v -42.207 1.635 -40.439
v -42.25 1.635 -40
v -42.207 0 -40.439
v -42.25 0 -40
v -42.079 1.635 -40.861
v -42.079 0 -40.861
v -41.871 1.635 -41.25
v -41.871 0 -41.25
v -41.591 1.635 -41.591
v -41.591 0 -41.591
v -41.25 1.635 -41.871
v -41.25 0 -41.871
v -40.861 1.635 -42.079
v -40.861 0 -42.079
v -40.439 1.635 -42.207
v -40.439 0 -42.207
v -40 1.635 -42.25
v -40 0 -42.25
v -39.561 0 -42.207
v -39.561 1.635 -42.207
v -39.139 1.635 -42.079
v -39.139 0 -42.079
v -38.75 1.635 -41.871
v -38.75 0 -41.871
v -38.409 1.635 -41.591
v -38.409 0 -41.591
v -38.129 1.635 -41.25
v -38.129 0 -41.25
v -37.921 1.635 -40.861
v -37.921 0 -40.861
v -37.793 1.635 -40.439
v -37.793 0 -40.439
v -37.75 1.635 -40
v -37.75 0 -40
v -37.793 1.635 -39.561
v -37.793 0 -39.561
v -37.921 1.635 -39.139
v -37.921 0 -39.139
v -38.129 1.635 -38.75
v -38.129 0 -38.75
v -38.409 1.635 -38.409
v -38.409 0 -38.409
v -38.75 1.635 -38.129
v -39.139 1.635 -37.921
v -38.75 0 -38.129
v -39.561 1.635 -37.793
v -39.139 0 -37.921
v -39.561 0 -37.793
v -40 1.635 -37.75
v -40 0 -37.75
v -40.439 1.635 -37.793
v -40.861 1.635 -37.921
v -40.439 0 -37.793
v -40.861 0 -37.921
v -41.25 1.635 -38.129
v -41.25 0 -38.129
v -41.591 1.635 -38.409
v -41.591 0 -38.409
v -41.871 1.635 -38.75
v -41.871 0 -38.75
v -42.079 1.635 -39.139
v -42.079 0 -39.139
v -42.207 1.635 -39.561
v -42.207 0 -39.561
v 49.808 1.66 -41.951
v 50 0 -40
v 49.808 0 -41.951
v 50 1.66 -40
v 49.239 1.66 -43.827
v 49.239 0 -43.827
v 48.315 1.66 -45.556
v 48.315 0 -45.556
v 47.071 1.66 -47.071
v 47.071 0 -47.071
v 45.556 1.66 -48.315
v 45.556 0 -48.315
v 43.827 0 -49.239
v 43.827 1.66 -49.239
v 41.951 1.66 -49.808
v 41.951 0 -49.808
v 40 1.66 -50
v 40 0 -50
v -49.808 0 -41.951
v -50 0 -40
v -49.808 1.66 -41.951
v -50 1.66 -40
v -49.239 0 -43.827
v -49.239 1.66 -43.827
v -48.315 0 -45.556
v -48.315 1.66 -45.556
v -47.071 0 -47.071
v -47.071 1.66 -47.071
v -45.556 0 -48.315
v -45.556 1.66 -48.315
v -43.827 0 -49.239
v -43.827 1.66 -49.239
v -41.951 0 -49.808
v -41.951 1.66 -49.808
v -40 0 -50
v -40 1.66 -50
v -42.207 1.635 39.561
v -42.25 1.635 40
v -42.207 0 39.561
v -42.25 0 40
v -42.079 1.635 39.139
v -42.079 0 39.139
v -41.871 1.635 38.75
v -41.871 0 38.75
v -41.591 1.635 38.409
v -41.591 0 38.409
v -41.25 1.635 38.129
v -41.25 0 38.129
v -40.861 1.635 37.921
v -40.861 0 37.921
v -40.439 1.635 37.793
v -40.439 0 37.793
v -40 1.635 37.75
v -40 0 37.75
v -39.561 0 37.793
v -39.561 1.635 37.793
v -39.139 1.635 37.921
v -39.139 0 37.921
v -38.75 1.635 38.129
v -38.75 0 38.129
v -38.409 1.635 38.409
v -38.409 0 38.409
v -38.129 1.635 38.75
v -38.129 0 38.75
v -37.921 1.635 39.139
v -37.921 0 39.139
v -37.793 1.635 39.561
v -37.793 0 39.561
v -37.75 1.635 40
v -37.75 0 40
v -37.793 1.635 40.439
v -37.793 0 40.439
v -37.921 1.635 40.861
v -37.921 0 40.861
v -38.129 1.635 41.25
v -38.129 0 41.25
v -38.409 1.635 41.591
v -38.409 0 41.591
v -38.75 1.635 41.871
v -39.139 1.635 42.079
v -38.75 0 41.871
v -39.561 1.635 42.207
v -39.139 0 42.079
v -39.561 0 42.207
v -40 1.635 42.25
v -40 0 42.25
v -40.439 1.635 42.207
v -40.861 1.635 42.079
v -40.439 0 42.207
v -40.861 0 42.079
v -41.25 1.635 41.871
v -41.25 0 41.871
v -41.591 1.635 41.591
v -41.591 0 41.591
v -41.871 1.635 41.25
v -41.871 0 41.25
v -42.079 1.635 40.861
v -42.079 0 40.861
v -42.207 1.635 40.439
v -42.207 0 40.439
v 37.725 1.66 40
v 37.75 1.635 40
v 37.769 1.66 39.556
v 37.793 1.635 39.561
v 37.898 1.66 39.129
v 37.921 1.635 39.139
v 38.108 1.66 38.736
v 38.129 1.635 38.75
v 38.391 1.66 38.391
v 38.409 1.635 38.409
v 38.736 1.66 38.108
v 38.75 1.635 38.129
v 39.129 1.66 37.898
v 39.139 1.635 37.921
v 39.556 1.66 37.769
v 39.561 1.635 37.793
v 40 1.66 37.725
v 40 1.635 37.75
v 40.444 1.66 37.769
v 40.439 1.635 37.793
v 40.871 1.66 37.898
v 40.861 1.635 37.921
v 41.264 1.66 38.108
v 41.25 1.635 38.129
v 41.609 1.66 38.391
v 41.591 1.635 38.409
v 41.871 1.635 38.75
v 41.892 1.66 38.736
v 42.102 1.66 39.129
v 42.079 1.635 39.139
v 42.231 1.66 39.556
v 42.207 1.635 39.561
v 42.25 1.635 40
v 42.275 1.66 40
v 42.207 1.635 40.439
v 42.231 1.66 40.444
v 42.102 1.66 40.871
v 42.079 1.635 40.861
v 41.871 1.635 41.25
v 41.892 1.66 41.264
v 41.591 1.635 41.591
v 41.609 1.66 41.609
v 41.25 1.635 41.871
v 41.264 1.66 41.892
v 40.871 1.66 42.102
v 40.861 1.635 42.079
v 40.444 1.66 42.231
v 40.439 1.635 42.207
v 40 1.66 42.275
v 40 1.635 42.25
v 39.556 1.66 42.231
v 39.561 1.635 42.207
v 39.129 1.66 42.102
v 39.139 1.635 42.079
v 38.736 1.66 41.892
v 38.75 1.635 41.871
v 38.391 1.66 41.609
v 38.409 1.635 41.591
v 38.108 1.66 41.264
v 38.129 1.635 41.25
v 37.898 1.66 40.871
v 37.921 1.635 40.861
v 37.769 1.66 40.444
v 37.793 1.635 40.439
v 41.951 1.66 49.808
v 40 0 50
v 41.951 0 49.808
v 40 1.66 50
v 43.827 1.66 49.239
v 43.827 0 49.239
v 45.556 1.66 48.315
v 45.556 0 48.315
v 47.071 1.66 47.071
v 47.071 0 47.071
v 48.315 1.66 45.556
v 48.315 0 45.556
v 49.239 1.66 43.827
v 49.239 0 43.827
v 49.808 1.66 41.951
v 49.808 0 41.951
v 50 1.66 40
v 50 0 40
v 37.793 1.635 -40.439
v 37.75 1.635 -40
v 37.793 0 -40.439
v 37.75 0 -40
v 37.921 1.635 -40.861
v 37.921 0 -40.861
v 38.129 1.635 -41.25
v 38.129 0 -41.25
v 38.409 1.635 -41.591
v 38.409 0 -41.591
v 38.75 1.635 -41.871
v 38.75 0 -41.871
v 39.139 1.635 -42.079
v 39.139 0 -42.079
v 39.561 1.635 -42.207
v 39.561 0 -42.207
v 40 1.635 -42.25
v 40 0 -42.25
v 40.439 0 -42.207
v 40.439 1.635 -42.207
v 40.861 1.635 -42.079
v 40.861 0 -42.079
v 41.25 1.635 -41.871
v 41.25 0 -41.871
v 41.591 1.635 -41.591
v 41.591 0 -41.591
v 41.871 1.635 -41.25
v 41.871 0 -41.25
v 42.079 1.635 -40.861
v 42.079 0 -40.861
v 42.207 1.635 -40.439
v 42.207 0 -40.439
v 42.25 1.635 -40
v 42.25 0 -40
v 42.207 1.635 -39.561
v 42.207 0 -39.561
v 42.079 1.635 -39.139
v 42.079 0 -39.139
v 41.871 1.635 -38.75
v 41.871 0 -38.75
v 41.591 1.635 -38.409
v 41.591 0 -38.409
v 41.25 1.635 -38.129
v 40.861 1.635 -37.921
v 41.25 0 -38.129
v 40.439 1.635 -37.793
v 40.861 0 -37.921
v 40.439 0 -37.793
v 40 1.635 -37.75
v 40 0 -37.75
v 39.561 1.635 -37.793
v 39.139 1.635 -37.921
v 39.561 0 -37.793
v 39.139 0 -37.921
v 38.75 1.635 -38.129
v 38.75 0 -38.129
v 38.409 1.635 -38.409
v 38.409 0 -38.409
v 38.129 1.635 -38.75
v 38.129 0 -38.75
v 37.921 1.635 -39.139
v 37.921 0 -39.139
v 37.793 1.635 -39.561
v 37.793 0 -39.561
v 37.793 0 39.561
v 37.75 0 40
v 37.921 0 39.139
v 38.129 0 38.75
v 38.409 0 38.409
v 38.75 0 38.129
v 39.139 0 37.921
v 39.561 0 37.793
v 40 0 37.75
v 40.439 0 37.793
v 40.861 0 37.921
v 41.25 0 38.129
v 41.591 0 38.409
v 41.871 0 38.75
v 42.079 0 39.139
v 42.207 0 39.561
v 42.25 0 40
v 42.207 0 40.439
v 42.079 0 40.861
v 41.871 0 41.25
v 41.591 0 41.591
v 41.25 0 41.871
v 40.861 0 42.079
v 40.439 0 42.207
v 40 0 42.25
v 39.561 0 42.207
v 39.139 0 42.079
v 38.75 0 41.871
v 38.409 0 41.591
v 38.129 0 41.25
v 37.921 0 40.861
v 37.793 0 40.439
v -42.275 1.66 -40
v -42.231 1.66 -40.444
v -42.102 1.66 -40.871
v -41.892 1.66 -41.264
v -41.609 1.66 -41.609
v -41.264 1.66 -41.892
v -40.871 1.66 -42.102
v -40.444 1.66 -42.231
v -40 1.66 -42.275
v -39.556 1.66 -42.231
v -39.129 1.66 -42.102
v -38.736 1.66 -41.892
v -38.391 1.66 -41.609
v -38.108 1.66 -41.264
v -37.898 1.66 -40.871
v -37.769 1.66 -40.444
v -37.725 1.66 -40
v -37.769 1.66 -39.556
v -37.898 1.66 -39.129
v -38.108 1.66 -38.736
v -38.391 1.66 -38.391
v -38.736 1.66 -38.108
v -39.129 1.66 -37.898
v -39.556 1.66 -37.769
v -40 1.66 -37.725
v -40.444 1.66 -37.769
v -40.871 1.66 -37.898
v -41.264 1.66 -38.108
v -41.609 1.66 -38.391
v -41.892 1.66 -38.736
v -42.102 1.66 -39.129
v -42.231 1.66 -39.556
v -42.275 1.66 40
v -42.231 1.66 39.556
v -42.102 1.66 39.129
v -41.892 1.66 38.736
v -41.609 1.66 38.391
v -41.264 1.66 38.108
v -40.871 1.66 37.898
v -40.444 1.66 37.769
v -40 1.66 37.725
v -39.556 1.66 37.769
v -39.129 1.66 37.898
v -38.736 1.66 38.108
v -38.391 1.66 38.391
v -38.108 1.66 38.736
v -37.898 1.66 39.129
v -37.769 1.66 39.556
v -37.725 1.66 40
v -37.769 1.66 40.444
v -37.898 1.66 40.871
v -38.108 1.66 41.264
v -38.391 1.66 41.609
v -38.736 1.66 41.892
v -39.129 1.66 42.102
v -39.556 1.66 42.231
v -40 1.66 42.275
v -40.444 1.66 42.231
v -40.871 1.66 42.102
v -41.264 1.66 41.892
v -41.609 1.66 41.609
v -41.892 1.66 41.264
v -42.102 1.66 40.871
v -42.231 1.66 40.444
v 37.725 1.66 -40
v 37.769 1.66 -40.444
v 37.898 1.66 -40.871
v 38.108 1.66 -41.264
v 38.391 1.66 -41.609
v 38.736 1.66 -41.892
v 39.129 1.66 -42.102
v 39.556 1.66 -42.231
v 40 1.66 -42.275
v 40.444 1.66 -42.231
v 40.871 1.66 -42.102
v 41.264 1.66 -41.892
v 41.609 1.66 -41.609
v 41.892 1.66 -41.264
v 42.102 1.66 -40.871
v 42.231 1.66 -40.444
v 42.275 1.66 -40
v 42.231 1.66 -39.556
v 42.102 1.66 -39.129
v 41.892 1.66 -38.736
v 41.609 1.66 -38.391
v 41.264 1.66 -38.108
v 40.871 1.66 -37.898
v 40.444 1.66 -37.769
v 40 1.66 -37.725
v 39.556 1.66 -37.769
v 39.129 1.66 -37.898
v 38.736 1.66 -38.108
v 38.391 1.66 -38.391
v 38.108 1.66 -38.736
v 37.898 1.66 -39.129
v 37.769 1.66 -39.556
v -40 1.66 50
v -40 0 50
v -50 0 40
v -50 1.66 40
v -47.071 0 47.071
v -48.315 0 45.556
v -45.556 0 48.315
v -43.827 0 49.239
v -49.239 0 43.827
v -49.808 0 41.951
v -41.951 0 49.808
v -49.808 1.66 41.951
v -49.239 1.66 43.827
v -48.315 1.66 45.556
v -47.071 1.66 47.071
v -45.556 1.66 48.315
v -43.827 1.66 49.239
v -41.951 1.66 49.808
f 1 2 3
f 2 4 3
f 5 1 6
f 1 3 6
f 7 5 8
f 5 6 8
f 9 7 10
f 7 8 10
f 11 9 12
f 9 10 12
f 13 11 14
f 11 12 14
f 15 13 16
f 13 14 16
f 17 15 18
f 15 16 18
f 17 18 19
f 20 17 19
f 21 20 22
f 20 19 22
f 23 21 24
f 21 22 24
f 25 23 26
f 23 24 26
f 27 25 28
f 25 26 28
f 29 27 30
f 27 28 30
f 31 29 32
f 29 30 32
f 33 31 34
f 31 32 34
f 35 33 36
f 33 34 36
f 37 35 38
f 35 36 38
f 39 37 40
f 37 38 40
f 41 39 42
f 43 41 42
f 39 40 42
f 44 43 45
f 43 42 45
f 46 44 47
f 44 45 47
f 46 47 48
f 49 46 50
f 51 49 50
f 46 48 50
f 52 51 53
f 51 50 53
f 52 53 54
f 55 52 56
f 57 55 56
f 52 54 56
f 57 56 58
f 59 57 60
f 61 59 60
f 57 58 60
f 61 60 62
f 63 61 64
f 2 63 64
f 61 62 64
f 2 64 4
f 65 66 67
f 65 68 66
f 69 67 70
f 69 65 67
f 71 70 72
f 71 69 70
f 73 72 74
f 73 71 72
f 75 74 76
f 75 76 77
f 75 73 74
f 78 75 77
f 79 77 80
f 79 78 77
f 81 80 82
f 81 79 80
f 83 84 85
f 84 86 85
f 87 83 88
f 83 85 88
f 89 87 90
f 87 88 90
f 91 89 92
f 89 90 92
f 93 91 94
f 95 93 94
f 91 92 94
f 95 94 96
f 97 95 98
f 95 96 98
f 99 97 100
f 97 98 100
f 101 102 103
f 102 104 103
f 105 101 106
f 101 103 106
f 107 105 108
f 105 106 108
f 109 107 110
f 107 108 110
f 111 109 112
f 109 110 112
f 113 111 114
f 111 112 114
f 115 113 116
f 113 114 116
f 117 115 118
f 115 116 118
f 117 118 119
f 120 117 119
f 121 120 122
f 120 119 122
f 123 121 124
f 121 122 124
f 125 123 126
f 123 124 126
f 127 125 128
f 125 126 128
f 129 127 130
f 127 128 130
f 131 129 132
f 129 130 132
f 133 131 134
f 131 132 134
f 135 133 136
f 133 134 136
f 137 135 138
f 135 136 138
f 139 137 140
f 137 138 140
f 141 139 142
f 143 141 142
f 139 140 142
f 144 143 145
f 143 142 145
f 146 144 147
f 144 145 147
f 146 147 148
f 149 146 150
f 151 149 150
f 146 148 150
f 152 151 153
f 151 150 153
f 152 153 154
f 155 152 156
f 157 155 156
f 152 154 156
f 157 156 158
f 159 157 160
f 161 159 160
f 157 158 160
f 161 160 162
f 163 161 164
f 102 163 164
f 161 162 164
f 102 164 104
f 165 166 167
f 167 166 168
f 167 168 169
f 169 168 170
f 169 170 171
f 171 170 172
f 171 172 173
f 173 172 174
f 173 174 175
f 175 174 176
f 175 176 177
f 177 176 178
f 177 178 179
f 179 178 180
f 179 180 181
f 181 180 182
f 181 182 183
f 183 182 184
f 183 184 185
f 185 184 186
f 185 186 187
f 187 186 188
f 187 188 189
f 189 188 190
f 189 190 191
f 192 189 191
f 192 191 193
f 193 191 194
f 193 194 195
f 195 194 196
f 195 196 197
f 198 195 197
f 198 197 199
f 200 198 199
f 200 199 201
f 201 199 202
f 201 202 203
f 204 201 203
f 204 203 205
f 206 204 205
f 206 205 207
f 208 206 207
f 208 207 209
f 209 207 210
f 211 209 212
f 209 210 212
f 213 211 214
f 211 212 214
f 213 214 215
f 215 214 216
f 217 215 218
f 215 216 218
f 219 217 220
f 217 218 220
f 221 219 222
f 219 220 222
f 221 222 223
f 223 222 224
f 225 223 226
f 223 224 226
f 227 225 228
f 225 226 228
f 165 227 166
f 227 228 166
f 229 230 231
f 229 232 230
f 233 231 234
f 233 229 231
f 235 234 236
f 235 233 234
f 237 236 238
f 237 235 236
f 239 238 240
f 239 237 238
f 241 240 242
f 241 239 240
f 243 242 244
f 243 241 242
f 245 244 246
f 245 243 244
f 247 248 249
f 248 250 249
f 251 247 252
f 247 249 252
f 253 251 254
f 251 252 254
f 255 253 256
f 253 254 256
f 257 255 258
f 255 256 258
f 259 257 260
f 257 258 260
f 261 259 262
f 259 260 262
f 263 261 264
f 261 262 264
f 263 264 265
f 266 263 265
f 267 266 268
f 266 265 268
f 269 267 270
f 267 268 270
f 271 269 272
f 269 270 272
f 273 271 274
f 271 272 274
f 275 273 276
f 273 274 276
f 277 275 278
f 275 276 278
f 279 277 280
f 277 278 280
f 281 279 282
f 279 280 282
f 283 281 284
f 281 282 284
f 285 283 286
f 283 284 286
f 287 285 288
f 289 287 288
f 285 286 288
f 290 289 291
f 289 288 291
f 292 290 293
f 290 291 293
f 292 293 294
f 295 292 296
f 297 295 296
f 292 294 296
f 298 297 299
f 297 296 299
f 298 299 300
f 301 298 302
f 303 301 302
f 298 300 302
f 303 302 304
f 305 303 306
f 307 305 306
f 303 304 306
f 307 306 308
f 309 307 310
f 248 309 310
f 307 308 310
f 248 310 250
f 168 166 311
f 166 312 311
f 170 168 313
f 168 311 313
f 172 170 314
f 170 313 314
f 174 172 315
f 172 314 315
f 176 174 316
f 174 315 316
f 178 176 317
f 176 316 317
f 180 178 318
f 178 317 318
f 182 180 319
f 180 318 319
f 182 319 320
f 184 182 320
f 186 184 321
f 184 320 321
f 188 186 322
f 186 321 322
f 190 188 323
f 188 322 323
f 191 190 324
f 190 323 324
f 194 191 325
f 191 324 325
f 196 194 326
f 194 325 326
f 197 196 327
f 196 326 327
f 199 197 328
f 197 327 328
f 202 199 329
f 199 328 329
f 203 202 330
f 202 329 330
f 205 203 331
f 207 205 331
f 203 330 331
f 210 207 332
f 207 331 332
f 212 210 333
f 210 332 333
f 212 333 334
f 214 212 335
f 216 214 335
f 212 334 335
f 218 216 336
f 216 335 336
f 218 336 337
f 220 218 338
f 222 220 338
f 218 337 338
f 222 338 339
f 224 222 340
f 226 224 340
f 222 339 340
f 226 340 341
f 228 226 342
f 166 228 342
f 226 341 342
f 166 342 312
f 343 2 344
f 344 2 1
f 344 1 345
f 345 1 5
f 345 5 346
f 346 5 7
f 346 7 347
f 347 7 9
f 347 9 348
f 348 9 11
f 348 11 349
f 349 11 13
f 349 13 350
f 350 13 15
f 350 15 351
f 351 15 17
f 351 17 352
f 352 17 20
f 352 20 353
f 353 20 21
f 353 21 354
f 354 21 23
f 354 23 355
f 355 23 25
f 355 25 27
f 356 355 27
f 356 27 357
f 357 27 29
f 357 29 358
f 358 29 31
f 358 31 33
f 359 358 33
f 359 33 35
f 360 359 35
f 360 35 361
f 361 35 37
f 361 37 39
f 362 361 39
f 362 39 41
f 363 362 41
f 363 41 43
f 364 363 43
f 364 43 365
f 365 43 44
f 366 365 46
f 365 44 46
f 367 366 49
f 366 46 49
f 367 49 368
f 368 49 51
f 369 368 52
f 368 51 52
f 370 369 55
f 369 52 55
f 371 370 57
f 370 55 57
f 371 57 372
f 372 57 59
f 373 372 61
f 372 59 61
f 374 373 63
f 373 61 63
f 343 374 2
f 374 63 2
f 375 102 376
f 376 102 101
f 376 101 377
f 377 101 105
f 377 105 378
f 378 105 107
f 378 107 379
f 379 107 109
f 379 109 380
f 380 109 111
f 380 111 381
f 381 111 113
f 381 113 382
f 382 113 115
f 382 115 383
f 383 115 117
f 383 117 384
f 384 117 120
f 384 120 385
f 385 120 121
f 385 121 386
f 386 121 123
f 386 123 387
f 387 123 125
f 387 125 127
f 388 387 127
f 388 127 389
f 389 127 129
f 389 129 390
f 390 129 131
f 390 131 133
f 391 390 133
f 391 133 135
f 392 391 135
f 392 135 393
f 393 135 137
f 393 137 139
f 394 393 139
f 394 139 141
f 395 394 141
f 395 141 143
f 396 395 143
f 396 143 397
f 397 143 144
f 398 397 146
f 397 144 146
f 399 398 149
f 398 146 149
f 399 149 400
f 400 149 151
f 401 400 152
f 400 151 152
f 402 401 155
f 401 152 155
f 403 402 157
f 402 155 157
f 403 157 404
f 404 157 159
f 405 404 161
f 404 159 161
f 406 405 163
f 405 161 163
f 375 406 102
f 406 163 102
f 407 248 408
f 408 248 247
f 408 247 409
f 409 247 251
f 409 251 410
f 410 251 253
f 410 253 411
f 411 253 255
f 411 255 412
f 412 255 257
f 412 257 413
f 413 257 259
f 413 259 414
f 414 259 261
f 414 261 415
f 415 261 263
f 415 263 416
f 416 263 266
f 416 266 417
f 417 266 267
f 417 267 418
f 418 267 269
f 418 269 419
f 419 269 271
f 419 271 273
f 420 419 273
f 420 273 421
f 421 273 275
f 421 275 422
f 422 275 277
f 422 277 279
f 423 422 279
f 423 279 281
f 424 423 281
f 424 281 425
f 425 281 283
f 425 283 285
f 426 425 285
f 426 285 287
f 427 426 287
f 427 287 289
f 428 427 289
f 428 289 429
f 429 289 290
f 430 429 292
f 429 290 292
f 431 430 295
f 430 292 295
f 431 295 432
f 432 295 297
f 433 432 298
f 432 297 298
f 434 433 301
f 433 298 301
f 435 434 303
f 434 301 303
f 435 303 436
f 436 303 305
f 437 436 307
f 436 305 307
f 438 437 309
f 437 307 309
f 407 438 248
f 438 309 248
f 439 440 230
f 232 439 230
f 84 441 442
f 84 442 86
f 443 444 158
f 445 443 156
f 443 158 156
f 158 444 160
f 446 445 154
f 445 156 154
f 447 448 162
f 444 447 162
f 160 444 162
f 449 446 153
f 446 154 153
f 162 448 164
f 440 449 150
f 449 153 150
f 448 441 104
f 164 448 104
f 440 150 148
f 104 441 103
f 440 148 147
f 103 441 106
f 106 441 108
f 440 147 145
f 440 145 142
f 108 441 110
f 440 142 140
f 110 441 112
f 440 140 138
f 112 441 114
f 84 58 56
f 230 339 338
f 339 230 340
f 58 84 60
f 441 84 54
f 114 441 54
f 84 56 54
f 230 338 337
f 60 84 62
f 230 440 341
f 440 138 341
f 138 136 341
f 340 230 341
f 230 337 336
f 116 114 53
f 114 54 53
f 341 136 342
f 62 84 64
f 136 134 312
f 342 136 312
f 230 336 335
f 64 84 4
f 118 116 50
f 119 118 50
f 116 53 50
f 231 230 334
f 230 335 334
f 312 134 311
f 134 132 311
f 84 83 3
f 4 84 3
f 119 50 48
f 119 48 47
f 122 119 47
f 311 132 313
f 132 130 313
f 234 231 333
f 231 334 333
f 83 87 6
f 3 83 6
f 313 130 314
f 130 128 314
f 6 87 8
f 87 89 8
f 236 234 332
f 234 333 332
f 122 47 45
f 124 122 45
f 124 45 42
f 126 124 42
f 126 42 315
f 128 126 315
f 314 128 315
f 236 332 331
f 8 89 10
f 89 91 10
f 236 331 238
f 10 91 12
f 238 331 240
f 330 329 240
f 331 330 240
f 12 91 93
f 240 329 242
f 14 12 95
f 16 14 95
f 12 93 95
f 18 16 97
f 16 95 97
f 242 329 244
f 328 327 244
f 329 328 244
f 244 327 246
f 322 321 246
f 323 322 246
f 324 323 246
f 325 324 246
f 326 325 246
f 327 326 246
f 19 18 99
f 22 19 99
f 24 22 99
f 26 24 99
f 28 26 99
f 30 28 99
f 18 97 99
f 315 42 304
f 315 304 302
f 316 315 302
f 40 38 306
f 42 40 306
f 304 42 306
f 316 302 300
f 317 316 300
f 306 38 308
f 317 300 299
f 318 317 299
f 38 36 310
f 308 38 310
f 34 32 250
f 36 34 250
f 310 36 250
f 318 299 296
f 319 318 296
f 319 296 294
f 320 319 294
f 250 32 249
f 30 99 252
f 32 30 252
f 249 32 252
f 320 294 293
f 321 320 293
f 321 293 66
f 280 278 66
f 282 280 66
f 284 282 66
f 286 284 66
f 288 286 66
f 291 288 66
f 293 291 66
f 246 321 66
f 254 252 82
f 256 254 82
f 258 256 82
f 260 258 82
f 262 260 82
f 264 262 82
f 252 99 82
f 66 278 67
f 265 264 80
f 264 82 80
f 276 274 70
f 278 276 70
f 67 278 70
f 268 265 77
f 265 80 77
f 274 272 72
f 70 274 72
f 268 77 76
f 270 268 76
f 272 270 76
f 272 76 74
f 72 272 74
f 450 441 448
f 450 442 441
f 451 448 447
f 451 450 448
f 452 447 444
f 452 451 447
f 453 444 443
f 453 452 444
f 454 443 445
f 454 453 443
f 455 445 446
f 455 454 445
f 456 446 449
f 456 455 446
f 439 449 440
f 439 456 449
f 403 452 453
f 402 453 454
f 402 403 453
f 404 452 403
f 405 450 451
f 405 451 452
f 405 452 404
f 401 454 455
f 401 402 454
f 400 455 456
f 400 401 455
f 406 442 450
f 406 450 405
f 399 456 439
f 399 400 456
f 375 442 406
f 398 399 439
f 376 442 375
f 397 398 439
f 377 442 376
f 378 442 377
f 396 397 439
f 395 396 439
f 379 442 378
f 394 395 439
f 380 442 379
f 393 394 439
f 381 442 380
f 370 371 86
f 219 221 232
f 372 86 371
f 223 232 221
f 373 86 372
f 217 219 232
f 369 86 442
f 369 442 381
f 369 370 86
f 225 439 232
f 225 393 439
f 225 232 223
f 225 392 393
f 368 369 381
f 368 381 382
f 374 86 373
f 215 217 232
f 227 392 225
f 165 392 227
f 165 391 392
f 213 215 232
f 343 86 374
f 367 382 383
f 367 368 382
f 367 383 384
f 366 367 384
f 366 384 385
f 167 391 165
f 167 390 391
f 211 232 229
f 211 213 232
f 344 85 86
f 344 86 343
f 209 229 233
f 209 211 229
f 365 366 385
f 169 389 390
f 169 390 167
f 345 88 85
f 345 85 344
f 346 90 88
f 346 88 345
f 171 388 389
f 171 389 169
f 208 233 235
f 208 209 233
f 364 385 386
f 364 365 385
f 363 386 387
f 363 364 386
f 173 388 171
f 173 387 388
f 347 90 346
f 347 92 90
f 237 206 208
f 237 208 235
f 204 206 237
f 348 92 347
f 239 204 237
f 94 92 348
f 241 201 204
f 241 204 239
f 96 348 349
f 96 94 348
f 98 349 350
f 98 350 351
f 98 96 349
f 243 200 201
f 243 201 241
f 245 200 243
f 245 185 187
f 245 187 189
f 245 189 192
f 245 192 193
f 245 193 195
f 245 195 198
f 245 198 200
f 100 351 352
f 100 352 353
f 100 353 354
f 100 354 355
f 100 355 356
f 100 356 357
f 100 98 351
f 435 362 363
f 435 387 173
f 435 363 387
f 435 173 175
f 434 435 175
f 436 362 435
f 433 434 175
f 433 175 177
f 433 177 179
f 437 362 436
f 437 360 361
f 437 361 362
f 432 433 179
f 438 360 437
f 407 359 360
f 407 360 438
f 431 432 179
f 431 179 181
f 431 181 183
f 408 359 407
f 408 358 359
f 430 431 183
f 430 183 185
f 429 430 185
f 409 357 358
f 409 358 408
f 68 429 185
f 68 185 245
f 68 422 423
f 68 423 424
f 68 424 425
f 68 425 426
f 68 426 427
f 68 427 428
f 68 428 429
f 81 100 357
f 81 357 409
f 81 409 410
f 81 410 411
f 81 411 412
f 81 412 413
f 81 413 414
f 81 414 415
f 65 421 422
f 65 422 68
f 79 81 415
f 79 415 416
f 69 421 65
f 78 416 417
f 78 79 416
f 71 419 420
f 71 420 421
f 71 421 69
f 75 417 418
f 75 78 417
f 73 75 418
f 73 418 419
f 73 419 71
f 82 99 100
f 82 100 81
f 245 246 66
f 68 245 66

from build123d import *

# Parameters (mm, degrees)
SKETCH1_W                      = 100
SKETCH1_H                      = 100
BOSS_EXTRUDE1_DEPTH            = 1.66
FILLET1_R                      = 10
M4_CLEARANCE_HOLE1_D           = 4.5
M4_CLEARANCE_HOLE1_DEPTH       = 22.648063607
M4_CLEARANCE_HOLE1_CSINK_D     = 4.55
M4_CLEARANCE_HOLE1_CSINK_ANGLE = 90
M4_CLEARANCE_HOLE1_TIP         = 1.351936393


with BuildPart() as part:
    # Sketch1 → Boss-Extrude1 (new body)
    with BuildSketch(Plane(origin=(0, 0, 0), x_dir=(1, 0, 0), z_dir=(0, 1, 0))):
        Rectangle(SKETCH1_W, SKETCH1_H)
    extrude(amount=BOSS_EXTRUDE1_DEPTH)

    # Fillet1
    fillet1_edges = [part.edges().sort_by_distance(p)[0] for p in [
        (50, 0.83, 50),
        (-50, 0.83, 50),
        (-50, 0.83, -50),
        (50, 0.83, -50),
    ]]
    fillet(fillet1_edges, radius=FILLET1_R)

    # M4 Clearance Hole1
    with Locations(Plane(origin=(0, 1.66, 0), x_dir=(1, 0, 0), z_dir=(0, 1, 0))):
        with Locations((-40, 40), (-40, -40), (40, -40), (40, 40)):
            CounterSinkHole(M4_CLEARANCE_HOLE1_D / 2, M4_CLEARANCE_HOLE1_CSINK_D / 2, depth=M4_CLEARANCE_HOLE1_DEPTH, counter_sink_angle=M4_CLEARANCE_HOLE1_CSINK_ANGLE)
            with Locations((0, 0, -(M4_CLEARANCE_HOLE1_DEPTH + M4_CLEARANCE_HOLE1_TIP / 2))):  # 118° drill point
                Cone(0, M4_CLEARANCE_HOLE1_D / 2, M4_CLEARANCE_HOLE1_TIP, mode=Mode.SUBTRACT)


solid = part.part
